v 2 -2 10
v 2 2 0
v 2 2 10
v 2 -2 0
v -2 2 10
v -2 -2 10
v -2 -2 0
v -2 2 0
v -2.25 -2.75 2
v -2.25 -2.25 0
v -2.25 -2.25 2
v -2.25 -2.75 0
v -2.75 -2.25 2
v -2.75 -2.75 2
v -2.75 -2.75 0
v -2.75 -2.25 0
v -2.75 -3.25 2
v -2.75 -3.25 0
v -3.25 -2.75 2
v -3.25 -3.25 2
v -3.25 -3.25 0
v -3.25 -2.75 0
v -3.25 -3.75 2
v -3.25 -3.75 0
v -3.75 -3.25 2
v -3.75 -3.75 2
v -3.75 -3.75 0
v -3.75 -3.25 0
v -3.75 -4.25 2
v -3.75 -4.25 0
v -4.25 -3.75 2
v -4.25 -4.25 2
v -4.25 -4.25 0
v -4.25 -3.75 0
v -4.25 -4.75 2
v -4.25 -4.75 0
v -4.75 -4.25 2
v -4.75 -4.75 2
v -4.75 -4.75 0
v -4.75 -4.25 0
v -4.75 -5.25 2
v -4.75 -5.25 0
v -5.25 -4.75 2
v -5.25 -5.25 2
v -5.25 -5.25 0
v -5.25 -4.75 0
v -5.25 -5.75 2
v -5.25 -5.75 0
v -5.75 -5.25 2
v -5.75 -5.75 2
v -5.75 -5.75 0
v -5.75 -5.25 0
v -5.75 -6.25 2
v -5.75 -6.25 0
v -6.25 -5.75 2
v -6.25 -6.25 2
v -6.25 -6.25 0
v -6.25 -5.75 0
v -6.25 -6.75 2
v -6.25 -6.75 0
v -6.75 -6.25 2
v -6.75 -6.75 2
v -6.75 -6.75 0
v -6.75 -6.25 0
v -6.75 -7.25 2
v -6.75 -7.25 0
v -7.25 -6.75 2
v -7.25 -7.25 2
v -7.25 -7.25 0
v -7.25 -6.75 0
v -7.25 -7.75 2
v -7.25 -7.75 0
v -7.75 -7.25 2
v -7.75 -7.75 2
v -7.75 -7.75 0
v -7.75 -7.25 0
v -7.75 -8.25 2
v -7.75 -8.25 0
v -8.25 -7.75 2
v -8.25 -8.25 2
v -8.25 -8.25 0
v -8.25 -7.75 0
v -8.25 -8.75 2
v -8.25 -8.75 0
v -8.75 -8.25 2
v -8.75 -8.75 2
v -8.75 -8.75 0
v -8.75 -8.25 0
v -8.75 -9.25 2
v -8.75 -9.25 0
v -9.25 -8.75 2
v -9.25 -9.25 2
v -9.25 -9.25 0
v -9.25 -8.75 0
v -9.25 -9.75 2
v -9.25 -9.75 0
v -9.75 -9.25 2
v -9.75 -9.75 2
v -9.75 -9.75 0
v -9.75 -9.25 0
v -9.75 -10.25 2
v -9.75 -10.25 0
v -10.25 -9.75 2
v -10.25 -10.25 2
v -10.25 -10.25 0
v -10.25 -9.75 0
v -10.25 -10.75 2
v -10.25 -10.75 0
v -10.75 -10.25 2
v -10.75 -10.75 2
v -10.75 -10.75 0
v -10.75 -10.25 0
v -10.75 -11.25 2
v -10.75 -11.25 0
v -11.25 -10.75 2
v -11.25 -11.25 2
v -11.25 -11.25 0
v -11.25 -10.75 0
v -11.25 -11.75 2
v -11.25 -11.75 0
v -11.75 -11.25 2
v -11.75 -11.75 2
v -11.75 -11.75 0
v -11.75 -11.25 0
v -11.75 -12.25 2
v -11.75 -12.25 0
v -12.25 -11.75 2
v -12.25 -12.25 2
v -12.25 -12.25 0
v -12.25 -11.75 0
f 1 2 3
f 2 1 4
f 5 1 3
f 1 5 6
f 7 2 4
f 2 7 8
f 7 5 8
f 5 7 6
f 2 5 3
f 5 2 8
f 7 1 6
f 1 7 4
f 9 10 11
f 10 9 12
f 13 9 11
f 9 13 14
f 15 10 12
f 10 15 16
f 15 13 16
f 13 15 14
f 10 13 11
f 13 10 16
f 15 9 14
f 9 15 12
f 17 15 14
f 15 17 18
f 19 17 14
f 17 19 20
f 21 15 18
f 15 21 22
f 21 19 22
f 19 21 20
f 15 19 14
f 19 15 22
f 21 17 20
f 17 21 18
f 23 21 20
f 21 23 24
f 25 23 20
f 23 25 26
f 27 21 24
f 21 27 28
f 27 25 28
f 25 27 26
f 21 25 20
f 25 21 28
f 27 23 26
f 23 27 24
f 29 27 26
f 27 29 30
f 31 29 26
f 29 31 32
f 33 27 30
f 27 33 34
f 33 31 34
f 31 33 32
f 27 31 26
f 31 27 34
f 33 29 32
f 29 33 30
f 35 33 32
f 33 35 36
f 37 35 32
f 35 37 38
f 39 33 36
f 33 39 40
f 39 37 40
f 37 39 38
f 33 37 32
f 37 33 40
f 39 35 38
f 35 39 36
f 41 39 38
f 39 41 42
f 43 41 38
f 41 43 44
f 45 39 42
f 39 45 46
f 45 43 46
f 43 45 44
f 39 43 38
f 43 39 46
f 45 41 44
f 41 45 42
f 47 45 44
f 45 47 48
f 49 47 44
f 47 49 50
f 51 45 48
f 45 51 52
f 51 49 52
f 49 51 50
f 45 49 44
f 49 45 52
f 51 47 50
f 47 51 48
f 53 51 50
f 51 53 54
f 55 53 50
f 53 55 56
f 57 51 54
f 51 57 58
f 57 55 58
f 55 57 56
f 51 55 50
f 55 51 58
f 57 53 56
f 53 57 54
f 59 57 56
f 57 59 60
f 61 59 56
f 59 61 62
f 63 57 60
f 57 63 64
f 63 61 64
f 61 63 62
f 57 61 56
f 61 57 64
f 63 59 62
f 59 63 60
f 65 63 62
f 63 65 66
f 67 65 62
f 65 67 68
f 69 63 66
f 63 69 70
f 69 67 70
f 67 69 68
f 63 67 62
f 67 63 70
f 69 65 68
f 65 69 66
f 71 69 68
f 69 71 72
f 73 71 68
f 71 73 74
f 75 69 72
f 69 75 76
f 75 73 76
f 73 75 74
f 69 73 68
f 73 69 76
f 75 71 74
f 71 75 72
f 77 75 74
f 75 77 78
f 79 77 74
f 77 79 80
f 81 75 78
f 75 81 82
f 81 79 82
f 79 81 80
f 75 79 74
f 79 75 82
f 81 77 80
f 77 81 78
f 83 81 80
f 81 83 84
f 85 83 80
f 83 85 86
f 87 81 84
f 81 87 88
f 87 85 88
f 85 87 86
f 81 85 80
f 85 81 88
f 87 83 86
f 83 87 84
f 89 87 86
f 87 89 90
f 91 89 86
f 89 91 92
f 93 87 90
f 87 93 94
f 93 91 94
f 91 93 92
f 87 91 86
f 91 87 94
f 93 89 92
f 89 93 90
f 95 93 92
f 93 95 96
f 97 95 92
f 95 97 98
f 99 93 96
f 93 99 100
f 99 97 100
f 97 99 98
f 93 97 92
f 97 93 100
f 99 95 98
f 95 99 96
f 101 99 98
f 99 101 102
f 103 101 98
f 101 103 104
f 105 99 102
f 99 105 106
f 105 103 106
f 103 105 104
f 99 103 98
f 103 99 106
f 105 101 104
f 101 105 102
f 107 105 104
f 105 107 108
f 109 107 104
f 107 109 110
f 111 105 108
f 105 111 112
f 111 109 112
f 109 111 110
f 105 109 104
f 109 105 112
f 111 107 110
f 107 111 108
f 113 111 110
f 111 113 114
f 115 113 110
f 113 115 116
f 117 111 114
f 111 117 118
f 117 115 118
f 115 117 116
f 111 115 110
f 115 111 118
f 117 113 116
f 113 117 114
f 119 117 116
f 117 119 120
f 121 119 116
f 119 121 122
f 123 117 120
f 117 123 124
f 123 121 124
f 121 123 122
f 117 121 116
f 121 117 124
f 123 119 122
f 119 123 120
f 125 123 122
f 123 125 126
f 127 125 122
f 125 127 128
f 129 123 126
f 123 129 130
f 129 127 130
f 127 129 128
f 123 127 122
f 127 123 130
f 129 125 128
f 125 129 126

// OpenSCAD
translate([0, 0, 5]) color([0,1,0,0.9]) cube([4, 4, 10], center=true);
translate([-2.5, -2.5, 1]) color([1,0,0]) cube([0.5, 0.5, 2], center=true);
translate([-3.0, -3.0, 1]) color([1,0,0]) cube([0.5, 0.5, 2], center=true);
translate([-3.5, -3.5, 1]) color([1,0,0]) cube([0.5, 0.5, 2], center=true);
translate([-4.0, -4.0, 1]) color([1,0,0]) cube([0.5, 0.5, 2], center=true);
translate([-4.5, -4.5, 1]) color([1,0,0]) cube([0.5, 0.5, 2], center=true);
translate([-5.0, -5.0, 1]) color([1,0,0]) cube([0.5, 0.5, 2], center=true);
translate([-5.5, -5.5, 1]) color([1,0,0]) cube([0.5, 0.5, 2], center=true);
translate([-6.0, -6.0, 1]) color([1,0,0]) cube([0.5, 0.5, 2], center=true);
translate([-6.5, -6.5, 1]) color([1,0,0]) cube([0.5, 0.5, 2], center=true);
translate([-7.0, -7.0, 1]) color([1,0,0]) cube([0.5, 0.5, 2], center=true);
translate([-7.5, -7.5, 1]) color([1,0,0]) cube([0.5, 0.5, 2], center=true);
translate([-8.0, -8.0, 1]) color([1,0,0]) cube([0.5, 0.5, 2], center=true);
translate([-8.5, -8.5, 1]) color([1,0,0]) cube([0.5, 0.5, 2], center=true);
translate([-9.0, -9.0, 1]) color([1,0,0]) cube([0.5, 0.5, 2], center=true);
translate([-9.5, -9.5, 1]) color([1,0,0]) cube([0.5, 0.5, 2], center=true);
translate([-10.0, -10.0, 1]) color([1,0,0]) cube([0.5, 0.5, 2], center=true);
translate([-10.5, -10.5, 1]) color([1,0,0]) cube([0.5, 0.5, 2], center=true);
translate([-11.0, -11.0, 1]) color([1,0,0]) cube([0.5, 0.5, 2], center=true);
translate([-11.5, -11.5, 1]) color([1,0,0]) cube([0.5, 0.5, 2], center=true);
translate([-12.0, -12.0, 1]) color([1,0,0]) cube([0.5, 0.5, 2], center=true);
